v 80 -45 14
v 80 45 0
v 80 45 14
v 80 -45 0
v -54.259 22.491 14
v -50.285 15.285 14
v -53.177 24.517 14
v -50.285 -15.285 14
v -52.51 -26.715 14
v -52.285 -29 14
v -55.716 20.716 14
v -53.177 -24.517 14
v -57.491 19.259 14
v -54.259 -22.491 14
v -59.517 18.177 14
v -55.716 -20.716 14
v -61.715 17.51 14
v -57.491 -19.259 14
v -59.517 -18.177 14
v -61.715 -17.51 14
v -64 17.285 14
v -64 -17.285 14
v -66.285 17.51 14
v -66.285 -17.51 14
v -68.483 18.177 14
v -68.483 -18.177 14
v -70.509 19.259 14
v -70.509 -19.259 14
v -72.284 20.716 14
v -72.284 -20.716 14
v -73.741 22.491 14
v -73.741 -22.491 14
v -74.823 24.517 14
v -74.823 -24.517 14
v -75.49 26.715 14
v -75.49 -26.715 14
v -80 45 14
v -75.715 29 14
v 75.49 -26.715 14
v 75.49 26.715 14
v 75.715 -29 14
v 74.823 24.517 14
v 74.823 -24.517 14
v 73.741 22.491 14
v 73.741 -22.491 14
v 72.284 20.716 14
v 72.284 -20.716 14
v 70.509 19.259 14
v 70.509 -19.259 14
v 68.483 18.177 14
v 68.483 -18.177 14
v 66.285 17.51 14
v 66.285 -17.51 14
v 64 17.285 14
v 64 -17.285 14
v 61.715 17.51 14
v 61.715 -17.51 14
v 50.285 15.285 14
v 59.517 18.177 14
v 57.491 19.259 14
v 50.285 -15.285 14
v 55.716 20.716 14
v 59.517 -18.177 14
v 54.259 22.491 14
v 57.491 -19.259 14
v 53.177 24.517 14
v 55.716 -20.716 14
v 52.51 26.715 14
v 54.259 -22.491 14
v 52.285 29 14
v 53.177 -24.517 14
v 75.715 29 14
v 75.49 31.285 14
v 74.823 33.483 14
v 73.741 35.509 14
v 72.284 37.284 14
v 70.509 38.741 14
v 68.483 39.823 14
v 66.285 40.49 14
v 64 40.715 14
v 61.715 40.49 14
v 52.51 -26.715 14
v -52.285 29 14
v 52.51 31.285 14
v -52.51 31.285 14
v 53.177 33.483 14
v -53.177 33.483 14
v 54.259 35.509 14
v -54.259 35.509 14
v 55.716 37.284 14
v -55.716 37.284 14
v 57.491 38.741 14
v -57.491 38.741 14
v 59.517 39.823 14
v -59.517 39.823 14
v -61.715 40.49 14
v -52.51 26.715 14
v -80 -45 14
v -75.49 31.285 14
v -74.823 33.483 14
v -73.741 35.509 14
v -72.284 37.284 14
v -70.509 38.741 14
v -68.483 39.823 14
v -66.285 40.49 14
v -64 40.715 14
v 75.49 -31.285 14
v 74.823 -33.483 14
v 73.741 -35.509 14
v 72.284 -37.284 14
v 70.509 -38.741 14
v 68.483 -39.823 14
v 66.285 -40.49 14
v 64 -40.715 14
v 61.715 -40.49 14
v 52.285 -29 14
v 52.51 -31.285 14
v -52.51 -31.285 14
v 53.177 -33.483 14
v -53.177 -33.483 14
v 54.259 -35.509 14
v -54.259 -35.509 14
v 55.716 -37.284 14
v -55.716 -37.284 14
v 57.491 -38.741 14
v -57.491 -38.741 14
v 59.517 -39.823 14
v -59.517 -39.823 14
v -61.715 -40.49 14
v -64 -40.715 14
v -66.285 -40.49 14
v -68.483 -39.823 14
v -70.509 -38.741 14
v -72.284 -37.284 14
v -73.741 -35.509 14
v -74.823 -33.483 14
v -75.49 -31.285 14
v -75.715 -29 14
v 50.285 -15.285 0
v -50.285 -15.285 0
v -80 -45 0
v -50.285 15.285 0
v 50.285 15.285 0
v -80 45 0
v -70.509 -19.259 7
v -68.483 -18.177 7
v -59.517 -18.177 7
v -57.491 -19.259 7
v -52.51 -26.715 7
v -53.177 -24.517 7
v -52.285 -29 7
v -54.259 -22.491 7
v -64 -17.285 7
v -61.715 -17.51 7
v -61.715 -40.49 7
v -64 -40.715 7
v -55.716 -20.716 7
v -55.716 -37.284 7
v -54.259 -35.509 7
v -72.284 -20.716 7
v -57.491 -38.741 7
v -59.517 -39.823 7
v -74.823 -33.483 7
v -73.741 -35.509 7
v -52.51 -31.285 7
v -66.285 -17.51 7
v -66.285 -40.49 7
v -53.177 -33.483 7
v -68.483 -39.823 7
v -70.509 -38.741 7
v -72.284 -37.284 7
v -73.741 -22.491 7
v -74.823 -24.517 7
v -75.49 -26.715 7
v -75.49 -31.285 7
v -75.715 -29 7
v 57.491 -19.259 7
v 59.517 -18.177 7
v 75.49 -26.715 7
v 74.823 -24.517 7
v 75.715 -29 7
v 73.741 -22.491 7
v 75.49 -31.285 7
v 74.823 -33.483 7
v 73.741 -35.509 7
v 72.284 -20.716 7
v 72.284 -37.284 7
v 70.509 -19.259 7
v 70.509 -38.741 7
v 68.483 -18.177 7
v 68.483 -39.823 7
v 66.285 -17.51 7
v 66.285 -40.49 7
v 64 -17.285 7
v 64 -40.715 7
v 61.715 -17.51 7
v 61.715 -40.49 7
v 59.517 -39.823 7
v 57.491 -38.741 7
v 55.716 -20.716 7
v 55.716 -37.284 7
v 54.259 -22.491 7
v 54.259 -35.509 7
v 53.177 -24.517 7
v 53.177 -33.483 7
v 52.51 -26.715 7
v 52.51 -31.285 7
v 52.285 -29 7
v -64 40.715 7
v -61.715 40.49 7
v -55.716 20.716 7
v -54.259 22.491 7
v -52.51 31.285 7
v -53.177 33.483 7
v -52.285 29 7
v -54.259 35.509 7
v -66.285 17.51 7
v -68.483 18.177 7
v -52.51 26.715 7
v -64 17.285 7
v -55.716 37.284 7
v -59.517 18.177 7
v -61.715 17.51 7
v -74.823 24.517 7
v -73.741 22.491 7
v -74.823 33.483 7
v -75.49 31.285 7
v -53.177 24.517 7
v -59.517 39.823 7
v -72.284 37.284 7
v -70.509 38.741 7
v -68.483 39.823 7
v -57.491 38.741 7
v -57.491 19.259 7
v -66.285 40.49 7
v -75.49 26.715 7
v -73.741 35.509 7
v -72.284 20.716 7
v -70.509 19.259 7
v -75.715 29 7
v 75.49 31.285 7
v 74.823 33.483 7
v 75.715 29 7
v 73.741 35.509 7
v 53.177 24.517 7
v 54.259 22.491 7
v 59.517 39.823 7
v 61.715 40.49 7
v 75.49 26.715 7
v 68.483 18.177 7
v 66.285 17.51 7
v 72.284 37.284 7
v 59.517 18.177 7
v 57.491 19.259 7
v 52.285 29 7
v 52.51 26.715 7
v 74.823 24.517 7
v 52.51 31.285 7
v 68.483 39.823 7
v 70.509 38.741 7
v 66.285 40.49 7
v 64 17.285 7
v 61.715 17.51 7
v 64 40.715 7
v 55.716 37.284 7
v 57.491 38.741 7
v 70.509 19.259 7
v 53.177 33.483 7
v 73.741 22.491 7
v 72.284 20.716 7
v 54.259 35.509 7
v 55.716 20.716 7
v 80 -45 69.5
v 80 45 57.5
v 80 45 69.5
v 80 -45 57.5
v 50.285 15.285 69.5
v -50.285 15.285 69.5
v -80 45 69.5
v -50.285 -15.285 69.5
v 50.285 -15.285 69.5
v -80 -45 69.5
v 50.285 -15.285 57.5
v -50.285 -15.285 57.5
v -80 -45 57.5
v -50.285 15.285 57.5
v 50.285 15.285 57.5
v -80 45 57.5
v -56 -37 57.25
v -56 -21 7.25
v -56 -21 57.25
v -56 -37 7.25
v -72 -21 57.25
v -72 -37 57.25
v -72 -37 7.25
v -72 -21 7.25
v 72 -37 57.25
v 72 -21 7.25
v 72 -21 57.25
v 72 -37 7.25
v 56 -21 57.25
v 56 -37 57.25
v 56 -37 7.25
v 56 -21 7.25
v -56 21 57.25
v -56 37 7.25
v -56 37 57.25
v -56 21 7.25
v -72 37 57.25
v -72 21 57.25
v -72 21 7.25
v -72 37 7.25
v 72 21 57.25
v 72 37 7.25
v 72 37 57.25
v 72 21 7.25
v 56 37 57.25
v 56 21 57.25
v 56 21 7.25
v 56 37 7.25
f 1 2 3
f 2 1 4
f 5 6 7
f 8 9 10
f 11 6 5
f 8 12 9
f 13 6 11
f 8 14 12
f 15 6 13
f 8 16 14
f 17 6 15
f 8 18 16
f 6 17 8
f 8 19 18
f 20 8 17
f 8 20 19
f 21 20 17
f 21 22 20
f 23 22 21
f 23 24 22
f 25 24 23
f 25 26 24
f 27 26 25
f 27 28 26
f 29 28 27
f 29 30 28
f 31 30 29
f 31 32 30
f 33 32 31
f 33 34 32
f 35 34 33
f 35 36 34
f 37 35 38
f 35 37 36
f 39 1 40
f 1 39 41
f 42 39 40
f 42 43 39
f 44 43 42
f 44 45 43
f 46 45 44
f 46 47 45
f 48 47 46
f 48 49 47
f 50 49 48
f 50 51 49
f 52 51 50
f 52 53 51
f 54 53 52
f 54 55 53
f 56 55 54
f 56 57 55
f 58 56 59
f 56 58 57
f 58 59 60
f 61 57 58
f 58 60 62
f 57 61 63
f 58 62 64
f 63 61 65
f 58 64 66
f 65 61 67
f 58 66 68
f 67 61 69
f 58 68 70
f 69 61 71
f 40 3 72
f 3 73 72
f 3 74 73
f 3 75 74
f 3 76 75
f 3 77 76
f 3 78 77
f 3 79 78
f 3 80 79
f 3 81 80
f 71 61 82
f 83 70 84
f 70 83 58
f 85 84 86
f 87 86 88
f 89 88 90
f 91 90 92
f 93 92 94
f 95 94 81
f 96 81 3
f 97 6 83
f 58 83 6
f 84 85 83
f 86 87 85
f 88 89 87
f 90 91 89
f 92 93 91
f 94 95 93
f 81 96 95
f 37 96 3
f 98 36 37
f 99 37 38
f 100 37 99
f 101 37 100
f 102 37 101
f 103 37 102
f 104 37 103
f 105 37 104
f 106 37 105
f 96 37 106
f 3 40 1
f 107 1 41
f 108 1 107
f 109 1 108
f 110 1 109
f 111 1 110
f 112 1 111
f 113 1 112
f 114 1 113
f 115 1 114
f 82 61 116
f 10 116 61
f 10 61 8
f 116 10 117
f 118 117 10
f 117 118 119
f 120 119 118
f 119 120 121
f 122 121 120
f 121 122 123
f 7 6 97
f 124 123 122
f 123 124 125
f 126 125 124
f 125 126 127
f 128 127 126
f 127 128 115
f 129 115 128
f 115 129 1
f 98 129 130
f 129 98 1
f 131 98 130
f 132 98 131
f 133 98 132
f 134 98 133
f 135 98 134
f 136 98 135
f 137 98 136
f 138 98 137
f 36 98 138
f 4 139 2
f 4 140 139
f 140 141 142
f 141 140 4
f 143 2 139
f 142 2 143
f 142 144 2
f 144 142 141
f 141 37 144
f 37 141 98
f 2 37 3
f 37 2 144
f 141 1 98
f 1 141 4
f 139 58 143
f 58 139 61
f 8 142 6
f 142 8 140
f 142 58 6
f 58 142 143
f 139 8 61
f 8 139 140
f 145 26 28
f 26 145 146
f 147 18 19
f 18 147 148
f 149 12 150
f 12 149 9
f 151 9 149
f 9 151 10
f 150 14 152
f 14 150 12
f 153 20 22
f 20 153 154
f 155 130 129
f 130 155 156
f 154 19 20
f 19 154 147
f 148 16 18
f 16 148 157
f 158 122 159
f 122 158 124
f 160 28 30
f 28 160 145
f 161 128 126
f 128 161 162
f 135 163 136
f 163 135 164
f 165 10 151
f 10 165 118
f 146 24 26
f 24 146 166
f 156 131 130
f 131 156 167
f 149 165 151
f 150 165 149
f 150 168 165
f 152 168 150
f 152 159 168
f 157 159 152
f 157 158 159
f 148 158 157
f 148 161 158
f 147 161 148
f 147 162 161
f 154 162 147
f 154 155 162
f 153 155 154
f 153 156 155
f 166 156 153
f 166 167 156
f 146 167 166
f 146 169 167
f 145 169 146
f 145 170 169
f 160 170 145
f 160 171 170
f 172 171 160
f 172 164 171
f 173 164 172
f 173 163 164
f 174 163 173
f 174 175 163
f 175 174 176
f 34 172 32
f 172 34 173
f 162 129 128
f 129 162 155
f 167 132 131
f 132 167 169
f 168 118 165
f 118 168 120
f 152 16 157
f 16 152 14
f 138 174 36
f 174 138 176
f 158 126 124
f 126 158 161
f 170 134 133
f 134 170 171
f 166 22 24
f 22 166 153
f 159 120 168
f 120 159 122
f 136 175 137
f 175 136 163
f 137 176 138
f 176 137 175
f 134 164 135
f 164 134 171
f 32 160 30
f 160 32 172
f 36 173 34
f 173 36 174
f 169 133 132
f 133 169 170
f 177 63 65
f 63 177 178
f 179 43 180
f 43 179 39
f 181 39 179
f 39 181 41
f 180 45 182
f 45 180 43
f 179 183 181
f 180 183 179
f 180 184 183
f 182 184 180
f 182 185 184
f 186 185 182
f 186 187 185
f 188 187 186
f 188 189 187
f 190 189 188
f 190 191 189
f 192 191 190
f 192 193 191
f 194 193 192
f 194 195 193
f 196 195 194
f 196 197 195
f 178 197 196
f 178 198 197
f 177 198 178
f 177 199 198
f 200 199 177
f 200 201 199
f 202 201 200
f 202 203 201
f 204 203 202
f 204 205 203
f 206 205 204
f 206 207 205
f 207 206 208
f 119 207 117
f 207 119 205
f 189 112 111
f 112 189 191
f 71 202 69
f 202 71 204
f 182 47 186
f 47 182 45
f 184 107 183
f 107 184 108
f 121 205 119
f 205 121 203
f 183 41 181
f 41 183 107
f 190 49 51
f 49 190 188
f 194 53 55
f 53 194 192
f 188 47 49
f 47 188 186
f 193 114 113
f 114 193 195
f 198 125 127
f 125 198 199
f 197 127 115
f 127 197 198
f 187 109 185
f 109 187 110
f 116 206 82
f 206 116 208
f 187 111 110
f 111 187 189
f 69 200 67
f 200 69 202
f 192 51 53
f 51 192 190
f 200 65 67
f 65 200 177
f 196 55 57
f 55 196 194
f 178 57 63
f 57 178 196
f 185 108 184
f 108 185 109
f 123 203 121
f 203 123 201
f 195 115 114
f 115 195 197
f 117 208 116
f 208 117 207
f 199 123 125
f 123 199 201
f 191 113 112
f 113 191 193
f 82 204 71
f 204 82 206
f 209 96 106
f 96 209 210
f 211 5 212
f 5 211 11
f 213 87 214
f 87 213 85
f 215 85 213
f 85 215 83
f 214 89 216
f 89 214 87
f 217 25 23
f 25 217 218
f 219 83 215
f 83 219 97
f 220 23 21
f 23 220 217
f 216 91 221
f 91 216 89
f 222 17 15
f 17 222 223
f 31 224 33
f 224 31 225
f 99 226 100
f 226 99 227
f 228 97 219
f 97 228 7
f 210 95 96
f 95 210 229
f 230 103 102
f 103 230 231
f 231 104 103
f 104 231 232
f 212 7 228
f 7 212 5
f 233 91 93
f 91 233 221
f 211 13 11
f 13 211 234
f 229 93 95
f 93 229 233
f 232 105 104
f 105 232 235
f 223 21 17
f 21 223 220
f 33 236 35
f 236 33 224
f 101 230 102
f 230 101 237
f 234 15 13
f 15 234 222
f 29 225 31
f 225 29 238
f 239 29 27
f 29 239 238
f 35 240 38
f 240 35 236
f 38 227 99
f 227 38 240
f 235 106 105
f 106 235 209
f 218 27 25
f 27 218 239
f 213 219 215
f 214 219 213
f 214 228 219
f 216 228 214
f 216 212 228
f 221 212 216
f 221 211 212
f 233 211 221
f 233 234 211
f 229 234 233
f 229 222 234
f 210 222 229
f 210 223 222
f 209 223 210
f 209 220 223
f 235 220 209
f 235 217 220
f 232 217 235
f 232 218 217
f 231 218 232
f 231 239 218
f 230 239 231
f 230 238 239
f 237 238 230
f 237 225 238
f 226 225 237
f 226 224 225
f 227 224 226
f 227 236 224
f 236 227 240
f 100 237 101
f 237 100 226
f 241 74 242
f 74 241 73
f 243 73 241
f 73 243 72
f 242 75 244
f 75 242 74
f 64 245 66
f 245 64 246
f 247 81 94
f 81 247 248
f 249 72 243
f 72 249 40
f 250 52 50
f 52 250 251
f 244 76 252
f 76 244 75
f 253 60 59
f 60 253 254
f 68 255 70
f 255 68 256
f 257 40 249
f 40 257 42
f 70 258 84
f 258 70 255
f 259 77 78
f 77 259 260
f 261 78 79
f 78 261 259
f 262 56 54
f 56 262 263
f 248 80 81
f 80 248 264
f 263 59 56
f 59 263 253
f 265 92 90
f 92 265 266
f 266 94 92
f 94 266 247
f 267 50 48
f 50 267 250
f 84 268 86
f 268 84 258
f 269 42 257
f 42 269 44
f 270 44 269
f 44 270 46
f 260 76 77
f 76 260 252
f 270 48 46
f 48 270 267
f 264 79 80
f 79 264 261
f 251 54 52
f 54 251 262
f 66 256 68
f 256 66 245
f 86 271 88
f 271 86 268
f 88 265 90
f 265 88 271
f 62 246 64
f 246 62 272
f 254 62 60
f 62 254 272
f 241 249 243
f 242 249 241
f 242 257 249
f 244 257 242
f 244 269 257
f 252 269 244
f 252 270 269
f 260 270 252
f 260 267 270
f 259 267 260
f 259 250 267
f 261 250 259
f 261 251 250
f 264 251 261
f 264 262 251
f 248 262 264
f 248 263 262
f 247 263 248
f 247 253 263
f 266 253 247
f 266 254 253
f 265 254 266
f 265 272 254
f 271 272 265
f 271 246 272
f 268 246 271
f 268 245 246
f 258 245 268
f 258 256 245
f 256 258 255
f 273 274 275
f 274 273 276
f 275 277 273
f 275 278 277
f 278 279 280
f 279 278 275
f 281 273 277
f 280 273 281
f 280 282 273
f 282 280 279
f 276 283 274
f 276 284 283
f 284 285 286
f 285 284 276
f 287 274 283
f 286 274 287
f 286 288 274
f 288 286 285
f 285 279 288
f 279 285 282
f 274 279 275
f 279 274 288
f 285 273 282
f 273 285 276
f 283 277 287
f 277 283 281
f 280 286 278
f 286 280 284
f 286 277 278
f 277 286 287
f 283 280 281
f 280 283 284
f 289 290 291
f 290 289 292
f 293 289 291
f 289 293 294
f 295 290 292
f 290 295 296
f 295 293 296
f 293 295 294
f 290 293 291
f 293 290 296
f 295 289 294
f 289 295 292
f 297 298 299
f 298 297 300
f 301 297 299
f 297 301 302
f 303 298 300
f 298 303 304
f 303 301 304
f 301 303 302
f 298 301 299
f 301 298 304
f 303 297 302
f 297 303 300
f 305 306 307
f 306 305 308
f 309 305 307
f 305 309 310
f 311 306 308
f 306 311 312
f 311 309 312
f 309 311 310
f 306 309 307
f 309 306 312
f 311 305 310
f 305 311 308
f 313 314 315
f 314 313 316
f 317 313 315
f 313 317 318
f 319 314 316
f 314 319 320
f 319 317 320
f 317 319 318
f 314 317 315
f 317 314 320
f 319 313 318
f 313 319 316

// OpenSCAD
$fn = 32;

// ------------------------------------------------------------------------
// Frame cube: base 160 x 90 mm, posts 50 mm tall
// Every part is its own module, assembly() places every instance.
// ------------------------------------------------------------------------

// --- part 1 ---
module base_frame() {
  difference() {
    translate([-80, -45, 0]) cube([160, 90, 14]);
    translate([-50.285, -15.285, -1]) cube([100.57, 30.57, 16]);
    translate([-64, -29, 7]) cylinder(h = 8, d = 23.43);
    translate([64, -29, 7]) cylinder(h = 8, d = 23.43);
    translate([-64, 29, 7]) cylinder(h = 8, d = 23.43);
    translate([64, 29, 7]) cylinder(h = 8, d = 23.43);
  }
}

// --- part 2 ---
module corner_post() {
  translate([-8, -8, 0]) cube([16, 16, 50]);
}

// --- part 3 ---
module top_frame() {
  difference() {
    translate([-80, -45, 0]) cube([160, 90, 12]);
    translate([-50.285, -15.285, -1]) cube([100.57, 30.57, 14]);
  }
}

// --- assembly ---
module assembly() {
  color([0.80, 0.24, 0.20]) translate([0, 0, 0]) rotate([0, 0, 0]) base_frame();
  color([0.20, 0.45, 0.75]) translate([-64, -29, 7.25]) rotate([0, 0, 0]) corner_post();
  color([0.25, 0.62, 0.32]) translate([64, -29, 7.25]) rotate([0, 0, 0]) corner_post();
  color([0.92, 0.70, 0.18]) translate([-64, 29, 7.25]) rotate([0, 0, 0]) corner_post();
  color([0.58, 0.35, 0.70]) translate([64, 29, 7.25]) rotate([0, 0, 0]) corner_post();
  color([0.16, 0.66, 0.66]) translate([0, 0, 57.5]) rotate([0, 0, 0]) top_frame();
}

assembly();
